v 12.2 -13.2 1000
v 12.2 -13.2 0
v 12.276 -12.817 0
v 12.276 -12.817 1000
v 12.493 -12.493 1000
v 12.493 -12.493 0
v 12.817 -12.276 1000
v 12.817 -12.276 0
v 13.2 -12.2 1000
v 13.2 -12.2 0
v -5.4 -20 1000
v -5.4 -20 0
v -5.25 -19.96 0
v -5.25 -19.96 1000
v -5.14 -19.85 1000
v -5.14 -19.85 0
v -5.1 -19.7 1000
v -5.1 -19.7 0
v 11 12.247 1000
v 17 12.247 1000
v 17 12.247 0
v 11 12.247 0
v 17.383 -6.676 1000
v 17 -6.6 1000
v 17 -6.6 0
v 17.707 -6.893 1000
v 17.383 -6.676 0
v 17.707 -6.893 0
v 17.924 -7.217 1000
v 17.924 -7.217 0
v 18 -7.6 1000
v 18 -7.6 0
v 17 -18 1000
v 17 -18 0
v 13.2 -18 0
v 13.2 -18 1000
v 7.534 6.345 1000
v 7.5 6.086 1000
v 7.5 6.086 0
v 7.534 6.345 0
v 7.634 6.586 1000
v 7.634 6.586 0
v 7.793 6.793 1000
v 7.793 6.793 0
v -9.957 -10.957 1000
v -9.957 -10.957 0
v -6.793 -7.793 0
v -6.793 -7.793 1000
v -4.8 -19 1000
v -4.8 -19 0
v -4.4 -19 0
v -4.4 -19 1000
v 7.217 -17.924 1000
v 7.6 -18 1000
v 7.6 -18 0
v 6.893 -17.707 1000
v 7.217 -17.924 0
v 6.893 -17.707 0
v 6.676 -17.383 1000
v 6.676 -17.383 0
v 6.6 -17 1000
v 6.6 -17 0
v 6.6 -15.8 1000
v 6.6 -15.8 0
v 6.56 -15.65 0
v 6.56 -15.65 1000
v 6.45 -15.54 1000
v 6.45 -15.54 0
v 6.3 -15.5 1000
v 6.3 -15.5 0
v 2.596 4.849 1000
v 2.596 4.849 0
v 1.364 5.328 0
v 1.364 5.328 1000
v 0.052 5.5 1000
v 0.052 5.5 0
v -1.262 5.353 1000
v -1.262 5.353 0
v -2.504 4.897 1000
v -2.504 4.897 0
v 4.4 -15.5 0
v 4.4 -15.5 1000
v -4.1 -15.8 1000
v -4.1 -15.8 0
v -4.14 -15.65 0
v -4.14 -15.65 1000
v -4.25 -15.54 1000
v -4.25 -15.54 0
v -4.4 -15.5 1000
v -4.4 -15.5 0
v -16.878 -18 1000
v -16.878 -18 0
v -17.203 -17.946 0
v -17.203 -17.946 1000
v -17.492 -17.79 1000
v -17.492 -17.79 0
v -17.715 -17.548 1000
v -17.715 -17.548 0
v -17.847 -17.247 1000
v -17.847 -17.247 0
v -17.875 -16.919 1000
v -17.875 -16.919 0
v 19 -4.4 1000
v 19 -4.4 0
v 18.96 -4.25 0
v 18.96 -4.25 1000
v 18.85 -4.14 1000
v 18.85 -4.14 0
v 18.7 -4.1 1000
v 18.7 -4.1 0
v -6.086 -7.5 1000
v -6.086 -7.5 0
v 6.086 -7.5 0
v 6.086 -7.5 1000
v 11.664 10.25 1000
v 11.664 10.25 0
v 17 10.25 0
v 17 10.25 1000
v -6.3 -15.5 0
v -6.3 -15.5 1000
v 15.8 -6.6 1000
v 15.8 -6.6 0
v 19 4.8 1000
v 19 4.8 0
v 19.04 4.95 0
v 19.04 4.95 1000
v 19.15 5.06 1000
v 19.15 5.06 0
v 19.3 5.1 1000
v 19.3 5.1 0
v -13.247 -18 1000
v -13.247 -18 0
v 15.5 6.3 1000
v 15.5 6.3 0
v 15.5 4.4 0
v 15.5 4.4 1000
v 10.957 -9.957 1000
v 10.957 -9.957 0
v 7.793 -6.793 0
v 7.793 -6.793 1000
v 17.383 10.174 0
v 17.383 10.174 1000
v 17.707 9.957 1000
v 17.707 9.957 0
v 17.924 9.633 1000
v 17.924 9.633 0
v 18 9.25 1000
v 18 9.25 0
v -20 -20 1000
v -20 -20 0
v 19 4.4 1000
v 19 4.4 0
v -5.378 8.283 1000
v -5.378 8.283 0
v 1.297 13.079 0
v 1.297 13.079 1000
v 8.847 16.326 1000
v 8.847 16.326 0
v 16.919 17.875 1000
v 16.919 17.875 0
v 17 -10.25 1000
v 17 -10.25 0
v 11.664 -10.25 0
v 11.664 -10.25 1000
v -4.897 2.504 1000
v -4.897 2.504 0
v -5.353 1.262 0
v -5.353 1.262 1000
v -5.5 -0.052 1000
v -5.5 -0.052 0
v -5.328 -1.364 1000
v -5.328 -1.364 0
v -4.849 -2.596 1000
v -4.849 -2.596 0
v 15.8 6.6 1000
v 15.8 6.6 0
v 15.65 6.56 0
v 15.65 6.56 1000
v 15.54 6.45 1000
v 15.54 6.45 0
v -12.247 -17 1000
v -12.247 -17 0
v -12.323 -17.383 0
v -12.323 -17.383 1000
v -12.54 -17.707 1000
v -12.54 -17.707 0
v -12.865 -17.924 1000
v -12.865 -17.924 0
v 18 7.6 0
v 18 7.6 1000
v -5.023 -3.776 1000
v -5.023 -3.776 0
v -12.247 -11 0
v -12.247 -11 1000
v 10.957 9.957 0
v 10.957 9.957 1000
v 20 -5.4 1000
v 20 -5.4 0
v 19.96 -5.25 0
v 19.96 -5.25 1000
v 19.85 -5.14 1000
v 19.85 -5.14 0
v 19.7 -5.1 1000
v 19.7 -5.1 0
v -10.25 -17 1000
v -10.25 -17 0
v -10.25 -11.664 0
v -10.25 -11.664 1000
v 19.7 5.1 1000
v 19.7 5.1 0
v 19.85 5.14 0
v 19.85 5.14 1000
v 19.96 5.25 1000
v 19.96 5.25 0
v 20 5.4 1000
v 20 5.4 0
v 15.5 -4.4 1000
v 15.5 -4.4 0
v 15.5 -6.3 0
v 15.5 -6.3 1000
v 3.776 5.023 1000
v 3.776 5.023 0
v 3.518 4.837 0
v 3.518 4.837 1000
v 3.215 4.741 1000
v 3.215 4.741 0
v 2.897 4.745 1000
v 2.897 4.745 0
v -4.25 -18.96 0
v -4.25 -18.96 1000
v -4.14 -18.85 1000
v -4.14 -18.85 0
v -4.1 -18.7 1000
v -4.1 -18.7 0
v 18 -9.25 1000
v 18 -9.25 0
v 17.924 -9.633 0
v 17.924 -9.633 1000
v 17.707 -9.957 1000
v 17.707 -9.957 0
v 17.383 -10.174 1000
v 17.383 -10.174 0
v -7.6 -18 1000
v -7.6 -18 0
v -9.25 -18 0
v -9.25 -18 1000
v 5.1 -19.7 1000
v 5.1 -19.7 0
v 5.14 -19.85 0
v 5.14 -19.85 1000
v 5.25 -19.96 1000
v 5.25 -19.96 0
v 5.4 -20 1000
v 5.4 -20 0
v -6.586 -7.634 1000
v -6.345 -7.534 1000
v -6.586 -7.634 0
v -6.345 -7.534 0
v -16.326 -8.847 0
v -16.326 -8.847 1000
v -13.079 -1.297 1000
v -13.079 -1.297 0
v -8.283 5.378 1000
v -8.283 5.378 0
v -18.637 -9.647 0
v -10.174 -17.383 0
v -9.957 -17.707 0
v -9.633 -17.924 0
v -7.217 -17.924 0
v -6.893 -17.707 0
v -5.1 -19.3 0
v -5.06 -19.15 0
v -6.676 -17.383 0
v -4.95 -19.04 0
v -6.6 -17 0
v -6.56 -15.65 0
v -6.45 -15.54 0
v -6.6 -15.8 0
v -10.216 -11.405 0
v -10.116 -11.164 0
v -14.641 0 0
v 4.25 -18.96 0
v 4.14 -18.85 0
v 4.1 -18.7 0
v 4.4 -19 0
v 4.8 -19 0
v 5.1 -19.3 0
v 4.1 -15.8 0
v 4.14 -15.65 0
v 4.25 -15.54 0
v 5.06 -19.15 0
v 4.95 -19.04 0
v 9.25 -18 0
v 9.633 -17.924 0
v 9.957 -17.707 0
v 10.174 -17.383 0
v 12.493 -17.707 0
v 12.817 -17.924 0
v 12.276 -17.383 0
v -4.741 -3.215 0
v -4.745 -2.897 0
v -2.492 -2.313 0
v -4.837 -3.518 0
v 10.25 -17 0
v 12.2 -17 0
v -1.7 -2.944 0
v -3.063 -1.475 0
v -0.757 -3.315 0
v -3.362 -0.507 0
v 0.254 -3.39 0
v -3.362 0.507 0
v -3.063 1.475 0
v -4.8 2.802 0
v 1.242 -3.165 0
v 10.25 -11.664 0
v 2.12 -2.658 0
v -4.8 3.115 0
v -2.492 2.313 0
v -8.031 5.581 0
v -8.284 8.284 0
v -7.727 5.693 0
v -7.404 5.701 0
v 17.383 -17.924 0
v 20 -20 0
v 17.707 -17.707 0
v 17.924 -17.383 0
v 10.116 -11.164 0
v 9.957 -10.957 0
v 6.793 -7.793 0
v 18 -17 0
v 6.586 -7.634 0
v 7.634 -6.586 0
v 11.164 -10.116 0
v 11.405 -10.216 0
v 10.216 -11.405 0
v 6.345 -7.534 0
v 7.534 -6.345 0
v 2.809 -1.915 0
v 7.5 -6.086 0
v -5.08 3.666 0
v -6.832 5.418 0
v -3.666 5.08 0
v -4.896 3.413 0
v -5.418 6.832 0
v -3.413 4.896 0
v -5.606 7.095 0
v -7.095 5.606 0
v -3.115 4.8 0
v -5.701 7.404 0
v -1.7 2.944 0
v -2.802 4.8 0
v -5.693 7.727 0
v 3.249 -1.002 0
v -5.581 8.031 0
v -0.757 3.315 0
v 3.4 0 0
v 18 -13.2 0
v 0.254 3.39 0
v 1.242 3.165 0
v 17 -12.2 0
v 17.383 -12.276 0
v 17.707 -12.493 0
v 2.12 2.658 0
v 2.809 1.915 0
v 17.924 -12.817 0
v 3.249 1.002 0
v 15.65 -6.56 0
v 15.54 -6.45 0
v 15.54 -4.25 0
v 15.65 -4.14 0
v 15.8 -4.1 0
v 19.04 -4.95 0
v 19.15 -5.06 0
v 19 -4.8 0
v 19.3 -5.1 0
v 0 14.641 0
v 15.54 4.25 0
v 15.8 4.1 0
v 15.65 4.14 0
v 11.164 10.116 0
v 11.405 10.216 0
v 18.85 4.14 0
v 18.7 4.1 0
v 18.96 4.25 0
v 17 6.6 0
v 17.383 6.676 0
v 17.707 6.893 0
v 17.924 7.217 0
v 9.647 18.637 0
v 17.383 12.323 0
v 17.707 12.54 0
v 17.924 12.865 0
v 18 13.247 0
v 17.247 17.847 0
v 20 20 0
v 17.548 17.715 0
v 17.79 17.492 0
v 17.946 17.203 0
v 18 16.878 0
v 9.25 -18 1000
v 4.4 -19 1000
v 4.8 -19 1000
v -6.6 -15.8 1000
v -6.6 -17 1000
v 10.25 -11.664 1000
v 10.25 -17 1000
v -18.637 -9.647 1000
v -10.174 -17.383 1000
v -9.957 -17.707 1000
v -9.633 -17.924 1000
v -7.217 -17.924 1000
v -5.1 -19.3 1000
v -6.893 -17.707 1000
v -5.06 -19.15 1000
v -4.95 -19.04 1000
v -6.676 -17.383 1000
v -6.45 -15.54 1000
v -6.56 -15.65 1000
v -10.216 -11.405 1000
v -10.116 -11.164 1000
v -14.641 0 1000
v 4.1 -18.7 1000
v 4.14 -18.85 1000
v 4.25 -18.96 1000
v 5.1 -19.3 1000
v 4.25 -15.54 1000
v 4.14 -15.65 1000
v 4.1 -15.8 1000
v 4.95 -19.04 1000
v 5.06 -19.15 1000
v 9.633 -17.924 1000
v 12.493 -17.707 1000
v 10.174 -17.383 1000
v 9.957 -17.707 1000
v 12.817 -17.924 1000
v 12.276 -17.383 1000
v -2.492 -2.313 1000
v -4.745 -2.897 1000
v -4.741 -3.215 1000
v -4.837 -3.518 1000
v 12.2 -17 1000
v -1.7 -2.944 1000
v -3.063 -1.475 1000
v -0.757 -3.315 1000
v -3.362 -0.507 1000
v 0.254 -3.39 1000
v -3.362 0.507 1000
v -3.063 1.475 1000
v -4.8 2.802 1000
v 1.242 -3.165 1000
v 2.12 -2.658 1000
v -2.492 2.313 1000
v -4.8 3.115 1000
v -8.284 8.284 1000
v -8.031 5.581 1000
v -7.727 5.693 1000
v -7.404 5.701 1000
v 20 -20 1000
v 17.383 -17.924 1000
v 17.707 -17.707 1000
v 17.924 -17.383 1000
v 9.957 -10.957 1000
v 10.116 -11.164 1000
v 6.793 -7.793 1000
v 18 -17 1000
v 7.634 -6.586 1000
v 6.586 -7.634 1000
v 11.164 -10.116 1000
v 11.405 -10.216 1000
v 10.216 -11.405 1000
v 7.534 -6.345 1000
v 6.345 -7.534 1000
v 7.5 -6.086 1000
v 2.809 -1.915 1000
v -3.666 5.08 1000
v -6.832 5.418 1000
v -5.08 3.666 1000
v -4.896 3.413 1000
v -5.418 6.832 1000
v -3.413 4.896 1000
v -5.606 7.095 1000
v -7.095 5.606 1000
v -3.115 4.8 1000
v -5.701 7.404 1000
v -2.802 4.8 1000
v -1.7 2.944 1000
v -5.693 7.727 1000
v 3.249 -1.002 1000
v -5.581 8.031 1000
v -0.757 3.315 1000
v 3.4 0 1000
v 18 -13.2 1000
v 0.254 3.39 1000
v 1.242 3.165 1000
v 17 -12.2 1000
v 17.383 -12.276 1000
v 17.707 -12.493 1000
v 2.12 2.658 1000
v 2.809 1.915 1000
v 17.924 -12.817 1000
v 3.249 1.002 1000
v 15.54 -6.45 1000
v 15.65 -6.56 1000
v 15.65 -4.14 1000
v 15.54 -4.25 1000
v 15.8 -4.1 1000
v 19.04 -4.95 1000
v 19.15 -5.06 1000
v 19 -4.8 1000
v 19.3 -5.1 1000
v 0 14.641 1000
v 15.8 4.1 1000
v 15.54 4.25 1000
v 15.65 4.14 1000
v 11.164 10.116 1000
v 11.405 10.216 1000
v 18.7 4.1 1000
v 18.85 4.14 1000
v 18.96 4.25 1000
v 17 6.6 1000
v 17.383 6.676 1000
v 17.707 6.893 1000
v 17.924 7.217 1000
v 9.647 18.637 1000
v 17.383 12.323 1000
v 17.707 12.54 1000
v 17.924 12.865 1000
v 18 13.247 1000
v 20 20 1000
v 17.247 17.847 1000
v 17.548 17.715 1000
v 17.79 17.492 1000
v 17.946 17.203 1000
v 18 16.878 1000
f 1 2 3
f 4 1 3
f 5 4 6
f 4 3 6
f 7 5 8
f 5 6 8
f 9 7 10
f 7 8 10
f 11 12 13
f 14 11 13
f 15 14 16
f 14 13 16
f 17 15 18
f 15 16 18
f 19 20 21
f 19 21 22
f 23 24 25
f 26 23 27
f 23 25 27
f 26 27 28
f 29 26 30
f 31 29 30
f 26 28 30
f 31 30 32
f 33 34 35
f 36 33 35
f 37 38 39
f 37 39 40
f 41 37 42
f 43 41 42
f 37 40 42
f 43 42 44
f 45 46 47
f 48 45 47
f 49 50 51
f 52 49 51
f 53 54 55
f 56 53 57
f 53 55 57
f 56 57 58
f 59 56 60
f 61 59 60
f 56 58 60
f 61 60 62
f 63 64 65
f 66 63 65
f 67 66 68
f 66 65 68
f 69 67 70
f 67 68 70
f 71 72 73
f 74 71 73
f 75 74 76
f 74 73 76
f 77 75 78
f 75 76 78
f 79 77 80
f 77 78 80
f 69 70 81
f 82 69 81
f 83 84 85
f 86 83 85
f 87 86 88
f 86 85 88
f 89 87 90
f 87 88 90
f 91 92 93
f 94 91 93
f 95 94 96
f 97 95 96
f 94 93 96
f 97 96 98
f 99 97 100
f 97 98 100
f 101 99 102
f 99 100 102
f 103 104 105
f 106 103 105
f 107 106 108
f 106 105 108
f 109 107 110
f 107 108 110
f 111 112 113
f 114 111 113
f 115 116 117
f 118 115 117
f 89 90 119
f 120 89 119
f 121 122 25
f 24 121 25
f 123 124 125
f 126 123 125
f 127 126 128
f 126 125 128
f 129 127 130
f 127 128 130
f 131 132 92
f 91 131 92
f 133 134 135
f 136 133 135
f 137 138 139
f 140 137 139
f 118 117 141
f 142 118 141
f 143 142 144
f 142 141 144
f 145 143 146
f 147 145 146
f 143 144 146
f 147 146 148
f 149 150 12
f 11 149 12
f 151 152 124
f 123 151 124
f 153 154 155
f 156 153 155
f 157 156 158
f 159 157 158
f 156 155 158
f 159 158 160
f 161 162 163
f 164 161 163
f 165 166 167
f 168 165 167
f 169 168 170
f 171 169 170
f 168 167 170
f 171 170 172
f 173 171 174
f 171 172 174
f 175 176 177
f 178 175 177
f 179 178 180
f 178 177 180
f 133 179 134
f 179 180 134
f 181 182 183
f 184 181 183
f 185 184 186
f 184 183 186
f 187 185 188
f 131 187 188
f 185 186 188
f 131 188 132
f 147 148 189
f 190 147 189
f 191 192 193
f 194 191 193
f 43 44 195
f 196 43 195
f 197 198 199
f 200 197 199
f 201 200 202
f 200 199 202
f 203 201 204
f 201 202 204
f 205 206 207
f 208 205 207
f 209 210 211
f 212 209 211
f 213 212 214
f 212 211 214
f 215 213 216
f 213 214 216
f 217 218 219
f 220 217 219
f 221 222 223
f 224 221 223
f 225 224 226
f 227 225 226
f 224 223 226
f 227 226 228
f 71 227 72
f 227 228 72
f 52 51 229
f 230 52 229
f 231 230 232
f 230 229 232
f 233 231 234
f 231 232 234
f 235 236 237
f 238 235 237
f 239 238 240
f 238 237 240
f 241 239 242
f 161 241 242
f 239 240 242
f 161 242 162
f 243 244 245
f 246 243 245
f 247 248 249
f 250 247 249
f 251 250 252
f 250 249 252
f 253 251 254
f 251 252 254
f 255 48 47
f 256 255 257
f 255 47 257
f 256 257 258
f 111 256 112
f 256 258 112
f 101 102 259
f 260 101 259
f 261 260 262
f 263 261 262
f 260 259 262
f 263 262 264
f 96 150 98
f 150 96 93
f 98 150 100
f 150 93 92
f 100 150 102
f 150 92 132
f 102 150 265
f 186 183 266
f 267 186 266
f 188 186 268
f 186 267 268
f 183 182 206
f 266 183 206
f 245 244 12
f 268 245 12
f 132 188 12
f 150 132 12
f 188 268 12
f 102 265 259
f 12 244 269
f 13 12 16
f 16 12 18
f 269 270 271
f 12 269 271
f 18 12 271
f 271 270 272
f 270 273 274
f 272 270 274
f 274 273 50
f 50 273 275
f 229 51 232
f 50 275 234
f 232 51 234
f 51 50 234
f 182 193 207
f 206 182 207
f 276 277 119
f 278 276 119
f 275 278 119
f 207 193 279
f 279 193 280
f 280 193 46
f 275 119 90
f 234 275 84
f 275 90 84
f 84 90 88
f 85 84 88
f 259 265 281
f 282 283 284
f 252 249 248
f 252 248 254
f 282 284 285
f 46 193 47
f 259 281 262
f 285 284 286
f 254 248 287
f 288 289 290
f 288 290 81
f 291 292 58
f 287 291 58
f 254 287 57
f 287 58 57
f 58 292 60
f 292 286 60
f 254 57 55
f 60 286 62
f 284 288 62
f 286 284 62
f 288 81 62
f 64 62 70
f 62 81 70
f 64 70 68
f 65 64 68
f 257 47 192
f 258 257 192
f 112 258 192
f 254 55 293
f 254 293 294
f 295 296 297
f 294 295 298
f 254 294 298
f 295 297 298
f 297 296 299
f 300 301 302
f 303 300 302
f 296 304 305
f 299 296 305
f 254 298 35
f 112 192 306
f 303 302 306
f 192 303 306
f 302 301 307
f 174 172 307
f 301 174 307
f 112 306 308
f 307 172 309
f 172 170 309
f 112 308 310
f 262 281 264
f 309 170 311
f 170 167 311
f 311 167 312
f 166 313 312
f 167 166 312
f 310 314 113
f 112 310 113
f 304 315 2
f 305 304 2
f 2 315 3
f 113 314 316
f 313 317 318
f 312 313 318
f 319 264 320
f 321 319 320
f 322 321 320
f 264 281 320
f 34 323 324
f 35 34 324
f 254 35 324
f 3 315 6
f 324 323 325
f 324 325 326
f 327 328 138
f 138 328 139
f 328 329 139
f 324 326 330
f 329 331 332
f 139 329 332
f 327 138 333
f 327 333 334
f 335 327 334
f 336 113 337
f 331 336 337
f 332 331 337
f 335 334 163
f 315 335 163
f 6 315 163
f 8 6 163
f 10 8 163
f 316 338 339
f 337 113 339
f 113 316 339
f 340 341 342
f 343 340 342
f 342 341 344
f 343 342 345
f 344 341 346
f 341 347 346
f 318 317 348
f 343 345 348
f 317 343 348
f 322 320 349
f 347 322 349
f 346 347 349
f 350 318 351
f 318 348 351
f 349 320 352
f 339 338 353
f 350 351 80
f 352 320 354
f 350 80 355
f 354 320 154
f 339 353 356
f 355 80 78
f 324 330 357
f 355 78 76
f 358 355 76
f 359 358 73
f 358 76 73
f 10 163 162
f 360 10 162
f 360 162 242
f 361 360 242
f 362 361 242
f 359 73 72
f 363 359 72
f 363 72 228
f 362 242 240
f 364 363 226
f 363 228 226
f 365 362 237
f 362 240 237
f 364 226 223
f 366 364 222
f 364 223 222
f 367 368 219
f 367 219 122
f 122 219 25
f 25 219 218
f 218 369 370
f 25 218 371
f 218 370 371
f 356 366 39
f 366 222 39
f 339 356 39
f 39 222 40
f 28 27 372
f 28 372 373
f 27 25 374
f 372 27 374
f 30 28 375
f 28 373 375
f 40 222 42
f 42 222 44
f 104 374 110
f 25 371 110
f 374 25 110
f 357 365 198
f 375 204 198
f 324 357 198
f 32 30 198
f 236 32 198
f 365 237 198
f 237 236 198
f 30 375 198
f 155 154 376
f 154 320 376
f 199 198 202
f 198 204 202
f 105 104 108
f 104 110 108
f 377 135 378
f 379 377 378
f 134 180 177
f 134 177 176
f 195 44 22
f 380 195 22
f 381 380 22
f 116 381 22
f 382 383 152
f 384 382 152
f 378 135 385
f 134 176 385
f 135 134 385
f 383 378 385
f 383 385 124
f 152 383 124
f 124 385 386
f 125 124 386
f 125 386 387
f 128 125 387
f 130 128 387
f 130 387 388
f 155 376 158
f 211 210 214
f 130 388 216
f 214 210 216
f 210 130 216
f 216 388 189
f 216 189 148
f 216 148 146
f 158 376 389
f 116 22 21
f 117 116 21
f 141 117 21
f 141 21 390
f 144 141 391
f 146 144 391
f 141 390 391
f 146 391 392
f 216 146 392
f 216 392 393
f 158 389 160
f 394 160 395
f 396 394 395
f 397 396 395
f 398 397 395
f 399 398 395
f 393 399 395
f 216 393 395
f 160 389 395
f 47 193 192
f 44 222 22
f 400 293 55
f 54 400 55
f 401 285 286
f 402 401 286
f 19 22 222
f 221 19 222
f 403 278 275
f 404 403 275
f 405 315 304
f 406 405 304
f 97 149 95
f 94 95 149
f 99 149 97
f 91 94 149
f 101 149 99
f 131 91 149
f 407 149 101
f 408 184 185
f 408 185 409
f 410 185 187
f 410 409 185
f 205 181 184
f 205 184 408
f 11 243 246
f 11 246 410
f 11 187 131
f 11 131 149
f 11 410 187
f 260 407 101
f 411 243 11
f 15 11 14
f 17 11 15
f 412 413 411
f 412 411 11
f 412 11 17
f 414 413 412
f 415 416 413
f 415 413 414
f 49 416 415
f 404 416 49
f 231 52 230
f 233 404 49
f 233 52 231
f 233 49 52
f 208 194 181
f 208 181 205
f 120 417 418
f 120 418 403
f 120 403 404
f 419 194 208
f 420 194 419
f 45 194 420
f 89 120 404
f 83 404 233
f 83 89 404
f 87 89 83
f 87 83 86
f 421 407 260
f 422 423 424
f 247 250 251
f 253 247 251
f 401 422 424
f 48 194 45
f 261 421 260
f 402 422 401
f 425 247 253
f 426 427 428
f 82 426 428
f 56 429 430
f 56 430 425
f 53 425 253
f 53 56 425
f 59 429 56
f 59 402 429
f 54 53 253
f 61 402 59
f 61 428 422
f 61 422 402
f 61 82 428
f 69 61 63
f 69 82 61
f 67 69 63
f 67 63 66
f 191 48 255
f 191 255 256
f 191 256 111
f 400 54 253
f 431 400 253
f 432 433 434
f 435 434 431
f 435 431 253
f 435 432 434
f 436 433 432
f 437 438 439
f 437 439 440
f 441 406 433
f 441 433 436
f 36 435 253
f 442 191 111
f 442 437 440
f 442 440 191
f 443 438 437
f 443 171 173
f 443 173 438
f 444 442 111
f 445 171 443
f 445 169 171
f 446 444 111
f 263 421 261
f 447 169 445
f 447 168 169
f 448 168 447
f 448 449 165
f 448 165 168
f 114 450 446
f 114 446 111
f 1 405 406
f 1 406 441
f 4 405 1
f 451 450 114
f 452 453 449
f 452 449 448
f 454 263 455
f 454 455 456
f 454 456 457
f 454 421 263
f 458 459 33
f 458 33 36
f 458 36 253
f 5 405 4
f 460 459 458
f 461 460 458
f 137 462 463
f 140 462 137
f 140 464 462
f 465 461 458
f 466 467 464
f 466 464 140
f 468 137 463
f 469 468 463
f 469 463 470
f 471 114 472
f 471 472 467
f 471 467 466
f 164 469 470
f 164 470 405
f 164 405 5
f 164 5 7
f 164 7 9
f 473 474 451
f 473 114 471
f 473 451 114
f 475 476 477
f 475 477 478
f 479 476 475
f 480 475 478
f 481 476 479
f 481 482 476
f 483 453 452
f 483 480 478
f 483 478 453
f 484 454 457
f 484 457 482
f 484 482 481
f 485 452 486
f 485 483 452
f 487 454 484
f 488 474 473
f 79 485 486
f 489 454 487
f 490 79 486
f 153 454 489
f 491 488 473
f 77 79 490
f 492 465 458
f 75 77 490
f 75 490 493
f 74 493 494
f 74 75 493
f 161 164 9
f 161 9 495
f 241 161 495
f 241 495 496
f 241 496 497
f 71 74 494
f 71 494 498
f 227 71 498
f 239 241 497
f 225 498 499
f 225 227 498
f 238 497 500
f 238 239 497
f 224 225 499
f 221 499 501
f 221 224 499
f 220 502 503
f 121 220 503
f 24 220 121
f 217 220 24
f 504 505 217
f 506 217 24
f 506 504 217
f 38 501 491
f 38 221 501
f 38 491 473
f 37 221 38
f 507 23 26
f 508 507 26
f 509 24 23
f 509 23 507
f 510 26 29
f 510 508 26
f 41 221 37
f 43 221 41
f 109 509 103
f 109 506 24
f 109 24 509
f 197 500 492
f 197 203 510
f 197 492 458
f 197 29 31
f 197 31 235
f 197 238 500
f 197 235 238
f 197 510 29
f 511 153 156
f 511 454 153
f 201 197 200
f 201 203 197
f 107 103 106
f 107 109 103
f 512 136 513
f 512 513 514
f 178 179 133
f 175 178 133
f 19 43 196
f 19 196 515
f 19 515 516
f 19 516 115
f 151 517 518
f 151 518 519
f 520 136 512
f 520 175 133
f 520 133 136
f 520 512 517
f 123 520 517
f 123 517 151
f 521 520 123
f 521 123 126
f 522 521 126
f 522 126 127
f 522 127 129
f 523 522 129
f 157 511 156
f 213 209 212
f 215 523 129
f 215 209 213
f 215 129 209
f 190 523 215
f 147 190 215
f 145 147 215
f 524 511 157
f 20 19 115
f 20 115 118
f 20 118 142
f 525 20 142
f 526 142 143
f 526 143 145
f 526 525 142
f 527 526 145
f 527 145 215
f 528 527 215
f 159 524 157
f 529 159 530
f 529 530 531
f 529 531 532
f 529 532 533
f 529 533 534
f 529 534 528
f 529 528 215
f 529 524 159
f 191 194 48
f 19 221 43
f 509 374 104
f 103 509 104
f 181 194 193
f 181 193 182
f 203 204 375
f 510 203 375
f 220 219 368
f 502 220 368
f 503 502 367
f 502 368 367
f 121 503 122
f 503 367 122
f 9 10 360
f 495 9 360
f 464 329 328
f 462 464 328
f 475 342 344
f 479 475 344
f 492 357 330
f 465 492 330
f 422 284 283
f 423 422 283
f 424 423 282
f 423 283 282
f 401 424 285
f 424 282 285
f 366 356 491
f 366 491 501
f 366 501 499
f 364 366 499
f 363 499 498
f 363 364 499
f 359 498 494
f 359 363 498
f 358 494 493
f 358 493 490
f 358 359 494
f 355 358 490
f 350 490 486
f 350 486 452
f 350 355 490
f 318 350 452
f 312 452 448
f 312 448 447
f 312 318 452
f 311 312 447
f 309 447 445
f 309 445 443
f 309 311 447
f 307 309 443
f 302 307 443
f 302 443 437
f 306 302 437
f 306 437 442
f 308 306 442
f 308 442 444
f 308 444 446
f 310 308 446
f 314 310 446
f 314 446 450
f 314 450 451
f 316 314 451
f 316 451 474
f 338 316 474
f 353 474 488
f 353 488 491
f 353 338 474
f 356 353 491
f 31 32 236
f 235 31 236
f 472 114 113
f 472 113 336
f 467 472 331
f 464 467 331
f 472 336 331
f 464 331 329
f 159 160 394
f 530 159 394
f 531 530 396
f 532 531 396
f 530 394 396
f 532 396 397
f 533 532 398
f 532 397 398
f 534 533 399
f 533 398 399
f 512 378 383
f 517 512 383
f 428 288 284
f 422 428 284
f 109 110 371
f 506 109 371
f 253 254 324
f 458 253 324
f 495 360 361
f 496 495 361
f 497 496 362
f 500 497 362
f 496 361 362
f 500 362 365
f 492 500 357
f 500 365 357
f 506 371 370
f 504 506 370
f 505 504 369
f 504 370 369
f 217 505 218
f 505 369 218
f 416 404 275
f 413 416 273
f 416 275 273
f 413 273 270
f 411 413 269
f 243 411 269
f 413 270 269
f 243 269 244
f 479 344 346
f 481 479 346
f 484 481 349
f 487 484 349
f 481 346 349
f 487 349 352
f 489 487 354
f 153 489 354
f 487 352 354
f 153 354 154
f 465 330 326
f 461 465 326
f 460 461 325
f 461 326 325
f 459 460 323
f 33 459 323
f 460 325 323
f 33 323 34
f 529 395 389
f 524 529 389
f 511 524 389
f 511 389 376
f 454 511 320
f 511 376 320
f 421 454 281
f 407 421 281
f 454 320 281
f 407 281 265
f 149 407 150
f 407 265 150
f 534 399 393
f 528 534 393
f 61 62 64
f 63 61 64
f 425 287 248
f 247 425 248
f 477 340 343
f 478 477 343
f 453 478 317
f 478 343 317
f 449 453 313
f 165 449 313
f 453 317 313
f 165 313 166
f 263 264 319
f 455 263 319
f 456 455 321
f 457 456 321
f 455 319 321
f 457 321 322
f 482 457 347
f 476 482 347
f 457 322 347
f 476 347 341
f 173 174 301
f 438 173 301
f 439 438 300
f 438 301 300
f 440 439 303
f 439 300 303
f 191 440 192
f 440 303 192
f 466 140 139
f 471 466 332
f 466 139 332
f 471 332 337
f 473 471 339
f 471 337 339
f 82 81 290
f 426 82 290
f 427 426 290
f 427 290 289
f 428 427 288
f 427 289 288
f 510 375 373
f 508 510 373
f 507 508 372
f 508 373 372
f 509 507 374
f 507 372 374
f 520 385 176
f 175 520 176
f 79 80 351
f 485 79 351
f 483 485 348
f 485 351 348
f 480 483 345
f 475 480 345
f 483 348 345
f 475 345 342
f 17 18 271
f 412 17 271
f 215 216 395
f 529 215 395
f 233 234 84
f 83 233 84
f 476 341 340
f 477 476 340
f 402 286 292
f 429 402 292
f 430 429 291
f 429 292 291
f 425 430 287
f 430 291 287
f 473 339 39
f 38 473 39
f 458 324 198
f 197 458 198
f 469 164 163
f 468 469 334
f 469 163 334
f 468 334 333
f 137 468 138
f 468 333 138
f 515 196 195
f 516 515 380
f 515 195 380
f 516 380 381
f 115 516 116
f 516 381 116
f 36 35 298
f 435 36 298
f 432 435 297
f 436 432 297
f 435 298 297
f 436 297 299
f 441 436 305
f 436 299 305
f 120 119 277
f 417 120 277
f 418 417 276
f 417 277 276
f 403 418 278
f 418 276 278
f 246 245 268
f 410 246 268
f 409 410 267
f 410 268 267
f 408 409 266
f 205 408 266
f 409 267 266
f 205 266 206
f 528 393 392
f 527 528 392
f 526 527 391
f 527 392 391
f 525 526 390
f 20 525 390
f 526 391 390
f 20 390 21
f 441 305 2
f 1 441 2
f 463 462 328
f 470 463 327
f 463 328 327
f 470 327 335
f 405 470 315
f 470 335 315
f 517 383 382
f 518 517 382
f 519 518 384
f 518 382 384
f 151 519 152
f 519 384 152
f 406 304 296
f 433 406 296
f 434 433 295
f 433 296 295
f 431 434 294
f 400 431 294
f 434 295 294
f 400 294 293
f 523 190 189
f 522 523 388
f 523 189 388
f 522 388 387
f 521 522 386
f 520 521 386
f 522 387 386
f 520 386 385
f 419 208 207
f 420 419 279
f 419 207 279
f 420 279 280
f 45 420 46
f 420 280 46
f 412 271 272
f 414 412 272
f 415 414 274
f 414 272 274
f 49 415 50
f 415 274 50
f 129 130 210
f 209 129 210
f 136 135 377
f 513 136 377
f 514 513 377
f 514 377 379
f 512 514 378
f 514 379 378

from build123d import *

# Parameters (mm, degrees)
SKETCH_1_R      = 3.4
EXTRUDE_1_DEPTH = 1000


with BuildPart() as part:
    # Эскиз1 → Бобышка-Вытянуть1 (new body)
    with BuildSketch(Plane.XY):
        with BuildLine():
            Line((5.4, -20), (10.25, -20))
            Line((10.25, -20), (20, -20))
            Line((20, -20), (20, -10.25))
            Line((20, -10.25), (20, -5.4))
            ThreePointArc((20, -5.4), (19.912132034, -5.187867966), (19.7, -5.1))
            Line((19.7, -5.1), (19.3, -5.1))
            ThreePointArc((19.3, -5.1), (19.087867966, -5.012132034), (19, -4.8))
            Line((19, -4.8), (19, -4.4))
            ThreePointArc((19, -4.4), (18.912132034, -4.187867966), (18.7, -4.1))
            Line((18.7, -4.1), (15.8, -4.1))
            ThreePointArc((15.8, -4.1), (15.587867966, -4.187867966), (15.5, -4.4))
            Line((15.5, -4.4), (15.5, -6.3))
            ThreePointArc((15.5, -6.3), (15.587867966, -6.512132034), (15.8, -6.6))
            Line((15.8, -6.6), (17, -6.6))
            ThreePointArc((17, -6.6), (17.707106781, -6.892893219), (18, -7.6))
            Line((18, -7.6), (18, -9.25))
            ThreePointArc((18, -9.25), (17.707106781, -9.957106781), (17, -10.25))
            Line((17, -10.25), (11.664213562, -10.25))
            ThreePointArc((11.664213562, -10.25), (11.28153013, -10.173879533), (10.957106781, -9.957106781))
            Line((10.957106781, -9.957106781), (7.792893219, -6.792893219))
            ThreePointArc((7.792893219, -6.792893219), (7.576120467, -6.46846987), (7.5, -6.085786438))
            Line((7.5, -6.085786438), (7.5, 6.085786438))
            ThreePointArc((7.5, 6.085786438), (7.576120467, 6.46846987), (7.792893219, 6.792893219))
            Line((7.792893219, 6.792893219), (10.957106781, 9.957106781))
            ThreePointArc((10.957106781, 9.957106781), (11.28153013, 10.173879533), (11.664213562, 10.25))
            Line((11.664213562, 10.25), (17, 10.25))
            ThreePointArc((17, 10.25), (17.707106781, 9.957106781), (18, 9.25))
            Line((18, 9.25), (18, 7.6))
            ThreePointArc((18, 7.6), (17.707106781, 6.892893219), (17, 6.6))
            Line((17, 6.6), (15.8, 6.6))
            ThreePointArc((15.8, 6.6), (15.587867966, 6.512132034), (15.5, 6.3))
            Line((15.5, 6.3), (15.5, 4.4))
            ThreePointArc((15.5, 4.4), (15.587867966, 4.187867966), (15.8, 4.1))
            Line((15.8, 4.1), (18.7, 4.1))
            ThreePointArc((18.7, 4.1), (18.912132034, 4.187867966), (19, 4.4))
            Line((19, 4.4), (19, 4.8))
            ThreePointArc((19, 4.8), (19.087867966, 5.012132034), (19.3, 5.1))
            Line((19.3, 5.1), (19.7, 5.1))
            ThreePointArc((19.7, 5.1), (19.912132034, 5.187867966), (20, 5.4))
            Line((20, 5.4), (20, 10.25))
            Line((20, 10.25), (20, 20))
            ThreePointArc((20, 20), (-8.284271247, 8.284271247), (-20, -20))
            Line((-20, -20), (-10.25, -20))
            Line((-10.25, -20), (-5.4, -20))
            ThreePointArc((-5.4, -20), (-5.187867966, -19.912132034), (-5.1, -19.7))
            Line((-5.1, -19.7), (-5.1, -19.3))
            ThreePointArc((-5.1, -19.3), (-5.012132034, -19.087867966), (-4.8, -19))
            Line((-4.8, -19), (-4.4, -19))
            ThreePointArc((-4.4, -19), (-4.187867966, -18.912132034), (-4.1, -18.7))
            Line((-4.1, -18.7), (-4.1, -15.8))
            ThreePointArc((-4.1, -15.8), (-4.187867966, -15.587867966), (-4.4, -15.5))
            Line((-4.4, -15.5), (-6.3, -15.5))
            ThreePointArc((-6.3, -15.5), (-6.512132034, -15.587867966), (-6.6, -15.8))
            Line((-6.6, -15.8), (-6.6, -17))
            ThreePointArc((-6.6, -17), (-6.892893219, -17.707106781), (-7.6, -18))
            Line((-7.6, -18), (-9.25, -18))
            ThreePointArc((-9.25, -18), (-9.957106781, -17.707106781), (-10.25, -17))
            Line((-10.25, -17), (-10.25, -11.664213562))
            ThreePointArc((-10.25, -11.664213562), (-10.173879533, -11.28153013), (-9.957106781, -10.957106781))
            Line((-9.957106781, -10.957106781), (-6.792893219, -7.792893219))
            ThreePointArc((-6.792893219, -7.792893219), (-6.46846987, -7.576120467), (-6.085786438, -7.5))
            Line((-6.085786438, -7.5), (6.085786438, -7.5))
            ThreePointArc((6.085786438, -7.5), (6.46846987, -7.576120467), (6.792893219, -7.792893219))
            Line((6.792893219, -7.792893219), (9.957106781, -10.957106781))
            ThreePointArc((9.957106781, -10.957106781), (10.173879533, -11.28153013), (10.25, -11.664213562))
            Line((10.25, -11.664213562), (10.25, -17))
            ThreePointArc((10.25, -17), (9.957106781, -17.707106781), (9.25, -18))
            Line((9.25, -18), (7.6, -18))
            ThreePointArc((7.6, -18), (6.892893219, -17.707106781), (6.6, -17))
            Line((6.6, -17), (6.6, -15.8))
            ThreePointArc((6.6, -15.8), (6.512132034, -15.587867966), (6.3, -15.5))
            Line((6.3, -15.5), (4.4, -15.5))
            ThreePointArc((4.4, -15.5), (4.187867966, -15.587867966), (4.1, -15.8))
            Line((4.1, -15.8), (4.1, -18.7))
            ThreePointArc((4.1, -18.7), (4.187867966, -18.912132034), (4.4, -19))
            Line((4.4, -19), (4.8, -19))
            ThreePointArc((4.8, -19), (5.012132034, -19.087867966), (5.1, -19.3))
            Line((5.1, -19.3), (5.1, -19.7))
            ThreePointArc((5.1, -19.7), (5.187867966, -19.912132034), (5.4, -20))
        make_face()
        with BuildLine():
            Line((-13.247331922, -18), (-16.878177829, -18))
            ThreePointArc((-16.878177829, -18), (-17.613392451, -17.677834389), (-17.874885338, -16.918918919))
            ThreePointArc((-17.874885338, -16.918918919), (-14.907238495, -4.983852003), (-8.283209505, 5.378338403))
            ThreePointArc((-8.283209505, 5.378338403), (-7.565951428, 5.710121829), (-6.831807736, 5.417594174))
            Line((-6.831807736, 5.417594174), (-5.080320702, 3.66610714))
            ThreePointArc((-5.080320702, 3.66610714), (-4.799630461, 3.114747086), (-4.897054025, 2.503769534))
            ThreePointArc((-4.897054025, 2.503769534), (-5.499751223, -0.052311407), (-4.848542652, -2.596465704))
            ThreePointArc((-4.848542652, -2.596465704), (-4.740862187, -3.21489496), (-5.02298908, -3.775657158))
            Line((-5.02298908, -3.775657158), (-12.247331922, -11))
            Line((-12.247331922, -11), (-12.247331922, -17))
            ThreePointArc((-12.247331922, -17), (-12.540225141, -17.707106781), (-13.247331922, -18))
        make_face(mode=Mode.SUBTRACT)
        with BuildLine():
            ThreePointArc((12.2, -13.2), (12.492893219, -12.492893219), (13.2, -12.2))
            Line((13.2, -12.2), (17, -12.2))
            ThreePointArc((17, -12.2), (17.707106781, -12.492893219), (18, -13.2))
            Line((18, -13.2), (18, -17))
            ThreePointArc((18, -17), (17.707106781, -17.707106781), (17, -18))
            Line((17, -18), (13.2, -18))
            ThreePointArc((13.2, -18), (12.492893219, -17.707106781), (12.2, -17))
            Line((12.2, -17), (12.2, -13.2))
        make_face(mode=Mode.SUBTRACT)
        Circle(SKETCH_1_R, mode=Mode.SUBTRACT)
        with BuildLine():
            Line((-3.66610714, 5.080320702), (-5.417594174, 6.831807736))
            ThreePointArc((-5.417594174, 6.831807736), (-5.710121829, 7.565951428), (-5.378338403, 8.283209505))
            ThreePointArc((-5.378338403, 8.283209505), (4.983852003, 14.907238495), (16.918918919, 17.874885338))
            ThreePointArc((16.918918919, 17.874885338), (17.677834389, 17.613392451), (18, 16.878177829))
            Line((18, 16.878177829), (18, 13.247331922))
            ThreePointArc((18, 13.247331922), (17.707106781, 12.540225141), (17, 12.247331922))
            Line((17, 12.247331922), (11, 12.247331922))
            Line((11, 12.247331922), (3.775657158, 5.02298908))
            ThreePointArc((3.775657158, 5.02298908), (3.21489496, 4.740862187), (2.596465704, 4.848542652))
            ThreePointArc((2.596465704, 4.848542652), (0.052311407, 5.499751223), (-2.503769534, 4.897054025))
            ThreePointArc((-2.503769534, 4.897054025), (-3.114747086, 4.799630461), (-3.66610714, 5.080320702))
        make_face(mode=Mode.SUBTRACT)
    extrude(amount=EXTRUDE_1_DEPTH)


solid = part.part
